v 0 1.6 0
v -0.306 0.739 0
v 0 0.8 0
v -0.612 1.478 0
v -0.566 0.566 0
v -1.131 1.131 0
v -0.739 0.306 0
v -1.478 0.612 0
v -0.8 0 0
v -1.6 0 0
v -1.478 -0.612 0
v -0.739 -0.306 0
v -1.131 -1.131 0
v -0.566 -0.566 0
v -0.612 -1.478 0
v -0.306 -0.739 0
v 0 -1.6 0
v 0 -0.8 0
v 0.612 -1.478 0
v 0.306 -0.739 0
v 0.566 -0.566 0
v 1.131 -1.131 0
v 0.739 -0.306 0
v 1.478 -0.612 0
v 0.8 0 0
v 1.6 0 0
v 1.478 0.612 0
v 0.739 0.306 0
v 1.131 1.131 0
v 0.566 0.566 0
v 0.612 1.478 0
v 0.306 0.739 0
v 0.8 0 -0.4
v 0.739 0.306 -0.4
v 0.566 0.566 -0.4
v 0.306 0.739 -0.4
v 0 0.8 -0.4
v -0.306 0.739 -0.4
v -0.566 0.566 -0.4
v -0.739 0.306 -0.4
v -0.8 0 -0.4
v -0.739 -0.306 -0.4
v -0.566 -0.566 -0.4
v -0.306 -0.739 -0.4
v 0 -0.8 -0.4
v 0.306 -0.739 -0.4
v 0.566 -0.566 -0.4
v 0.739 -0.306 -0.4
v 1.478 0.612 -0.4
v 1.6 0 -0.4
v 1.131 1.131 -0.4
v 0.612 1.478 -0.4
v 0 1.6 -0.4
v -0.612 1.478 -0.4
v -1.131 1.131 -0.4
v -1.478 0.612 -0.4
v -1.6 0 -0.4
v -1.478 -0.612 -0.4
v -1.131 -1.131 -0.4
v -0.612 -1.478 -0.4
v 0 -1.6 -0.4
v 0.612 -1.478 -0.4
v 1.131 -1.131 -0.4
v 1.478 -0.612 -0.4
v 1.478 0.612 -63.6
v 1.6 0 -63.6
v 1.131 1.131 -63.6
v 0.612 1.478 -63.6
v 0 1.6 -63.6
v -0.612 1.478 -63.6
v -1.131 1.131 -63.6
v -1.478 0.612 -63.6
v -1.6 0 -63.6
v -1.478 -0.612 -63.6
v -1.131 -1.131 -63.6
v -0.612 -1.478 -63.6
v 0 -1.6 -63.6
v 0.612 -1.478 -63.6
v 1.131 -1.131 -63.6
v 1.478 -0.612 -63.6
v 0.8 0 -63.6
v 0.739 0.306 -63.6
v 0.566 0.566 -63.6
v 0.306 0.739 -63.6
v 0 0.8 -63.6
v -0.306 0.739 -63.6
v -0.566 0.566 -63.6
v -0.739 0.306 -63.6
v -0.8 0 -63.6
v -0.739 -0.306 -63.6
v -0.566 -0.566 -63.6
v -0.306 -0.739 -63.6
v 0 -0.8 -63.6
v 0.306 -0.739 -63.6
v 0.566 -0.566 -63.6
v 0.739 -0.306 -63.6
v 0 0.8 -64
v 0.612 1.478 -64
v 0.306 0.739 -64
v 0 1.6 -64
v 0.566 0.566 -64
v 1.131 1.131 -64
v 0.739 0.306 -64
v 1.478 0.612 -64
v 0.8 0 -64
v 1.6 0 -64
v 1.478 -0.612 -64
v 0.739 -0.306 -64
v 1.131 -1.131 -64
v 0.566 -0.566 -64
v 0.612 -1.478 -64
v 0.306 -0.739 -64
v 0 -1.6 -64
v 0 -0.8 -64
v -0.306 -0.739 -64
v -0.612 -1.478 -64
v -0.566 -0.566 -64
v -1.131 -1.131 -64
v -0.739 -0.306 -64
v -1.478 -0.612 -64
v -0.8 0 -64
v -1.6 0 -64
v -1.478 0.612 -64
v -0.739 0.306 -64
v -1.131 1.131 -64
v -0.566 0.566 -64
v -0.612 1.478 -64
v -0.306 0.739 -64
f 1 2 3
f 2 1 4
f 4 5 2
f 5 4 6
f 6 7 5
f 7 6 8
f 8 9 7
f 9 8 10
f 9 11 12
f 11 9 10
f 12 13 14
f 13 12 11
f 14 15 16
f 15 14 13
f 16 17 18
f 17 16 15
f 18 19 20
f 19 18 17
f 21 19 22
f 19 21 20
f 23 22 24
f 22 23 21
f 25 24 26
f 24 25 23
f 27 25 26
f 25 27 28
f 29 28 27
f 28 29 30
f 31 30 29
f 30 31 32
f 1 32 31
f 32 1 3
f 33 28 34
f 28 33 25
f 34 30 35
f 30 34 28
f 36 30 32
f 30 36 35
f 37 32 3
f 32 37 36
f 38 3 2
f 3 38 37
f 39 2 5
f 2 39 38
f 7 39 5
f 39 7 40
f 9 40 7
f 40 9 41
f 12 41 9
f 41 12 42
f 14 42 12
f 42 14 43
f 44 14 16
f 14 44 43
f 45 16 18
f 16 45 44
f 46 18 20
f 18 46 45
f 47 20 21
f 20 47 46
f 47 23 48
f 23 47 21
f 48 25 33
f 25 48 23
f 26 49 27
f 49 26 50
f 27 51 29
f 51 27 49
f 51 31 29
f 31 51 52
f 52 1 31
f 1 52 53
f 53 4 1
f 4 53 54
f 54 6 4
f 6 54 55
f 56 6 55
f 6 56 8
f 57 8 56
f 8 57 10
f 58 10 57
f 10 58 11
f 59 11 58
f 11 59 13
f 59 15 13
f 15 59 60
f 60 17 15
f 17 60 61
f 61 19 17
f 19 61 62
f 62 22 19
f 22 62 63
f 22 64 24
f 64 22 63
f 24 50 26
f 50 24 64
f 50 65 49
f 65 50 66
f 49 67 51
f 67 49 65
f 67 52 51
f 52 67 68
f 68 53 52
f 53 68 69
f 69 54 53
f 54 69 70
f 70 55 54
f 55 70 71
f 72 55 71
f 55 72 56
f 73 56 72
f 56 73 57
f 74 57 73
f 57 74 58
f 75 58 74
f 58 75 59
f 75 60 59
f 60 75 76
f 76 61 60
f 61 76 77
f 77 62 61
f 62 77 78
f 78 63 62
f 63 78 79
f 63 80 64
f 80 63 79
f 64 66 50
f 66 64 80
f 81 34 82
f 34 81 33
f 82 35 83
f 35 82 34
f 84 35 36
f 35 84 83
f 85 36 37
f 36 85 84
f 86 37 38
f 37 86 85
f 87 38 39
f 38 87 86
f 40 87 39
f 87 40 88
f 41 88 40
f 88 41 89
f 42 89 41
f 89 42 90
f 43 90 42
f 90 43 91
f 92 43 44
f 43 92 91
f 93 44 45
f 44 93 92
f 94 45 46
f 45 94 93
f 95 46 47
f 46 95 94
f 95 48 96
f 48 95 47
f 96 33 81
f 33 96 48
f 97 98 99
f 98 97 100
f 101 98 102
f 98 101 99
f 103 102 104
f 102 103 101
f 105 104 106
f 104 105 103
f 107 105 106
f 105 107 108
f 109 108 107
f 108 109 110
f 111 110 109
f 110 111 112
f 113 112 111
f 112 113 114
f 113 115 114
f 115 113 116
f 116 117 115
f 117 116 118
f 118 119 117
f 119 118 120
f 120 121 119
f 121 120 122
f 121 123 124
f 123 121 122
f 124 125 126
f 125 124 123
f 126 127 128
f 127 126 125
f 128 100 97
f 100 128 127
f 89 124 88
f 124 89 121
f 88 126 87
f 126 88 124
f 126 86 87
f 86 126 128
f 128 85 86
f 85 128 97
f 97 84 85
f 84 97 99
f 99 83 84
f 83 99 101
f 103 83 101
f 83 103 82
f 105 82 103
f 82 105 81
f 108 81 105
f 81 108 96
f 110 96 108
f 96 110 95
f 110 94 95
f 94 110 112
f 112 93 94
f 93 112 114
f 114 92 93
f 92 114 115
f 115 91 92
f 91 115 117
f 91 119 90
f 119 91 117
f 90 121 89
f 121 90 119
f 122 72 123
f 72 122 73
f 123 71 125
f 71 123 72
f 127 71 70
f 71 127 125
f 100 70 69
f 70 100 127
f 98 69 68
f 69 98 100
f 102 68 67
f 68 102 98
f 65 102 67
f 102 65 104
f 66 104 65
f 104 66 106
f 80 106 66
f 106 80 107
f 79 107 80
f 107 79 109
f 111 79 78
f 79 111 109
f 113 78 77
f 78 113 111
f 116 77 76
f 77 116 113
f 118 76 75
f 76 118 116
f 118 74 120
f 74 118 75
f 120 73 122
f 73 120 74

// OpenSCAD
// file: ../p/4-4ring1.scad
use <../lib.scad>
function ldraw_lib__4_4ring1() = [
// 0 Ring  1 x 1.0
// 0 Name: 4-4ring1.dat
// 0 Author: James Jessiman
// 0 !LDRAW_ORG Primitive UPDATE 2009-01
// 0 !LICENSE Licensed under CC BY 2.0 and CC BY 4.0 : see CAreadme.txt
// 
// 0 BFC CERTIFY CCW
  [0,"BFC","CERTIFY"],
  [0,"BFC","CCW"],
// 
// 0 !HISTORY 1998-12-15 [PTadmin] Official Update 1998-10
// 0 !HISTORY 2002-04-08 [BrickCaster] Modified for BFC compliance
// 0 !HISTORY 2002-04-25 [PTadmin] Official Update 2002-02
// 0 !HISTORY 2007-06-24 [PTadmin] Header formatted for Contributor Agreement
// 0 !HISTORY 2008-07-01 [PTadmin] Official Update 2008-01
// 0 !HISTORY 2008-08-26 [cwdee] Switch polygon winding and rename
// 0 !HISTORY 2009-05-02 [PTadmin] Official Update 2009-01
// 
// 
// 4 16 -0.7654 0 1.8478 -0.3827 0 0.9239 0 0 1 0 0 2
  [4,16,-0.7654,0,1.8478,-0.3827,0,0.9239,0,0,1,0,0,2],
// 4 16 -1.4142 0 1.4142 -0.7071 0 0.7071 -0.3827 0 0.9239 -0.7654 0 1.8478
  [4,16,-1.4142,0,1.4142,-0.7071,0,0.7071,-0.3827,0,0.9239,-0.7654,0,1.8478],
// 4 16 -1.8478 0 0.7654 -0.9239 0 0.3827 -0.7071 0 0.7071 -1.4142 0 1.41420
  [4,16,-1.8478,0,0.7654,-0.9239,0,0.3827,-0.7071,0,0.7071,-1.4142,0,1.41420],
// 4 16 -2 0 0 -1 0 0 -0.9239 0 0.3827 -1.8478 0 0.7654
  [4,16,-2,0,0,-1,0,0,-0.9239,0,0.3827,-1.8478,0,0.7654],
// 4 16 -1.8478 0 -0.7654 -0.9239 0 -0.3827 -1 0 0 -2 0 0
  [4,16,-1.8478,0,-0.7654,-0.9239,0,-0.3827,-1,0,0,-2,0,0],
// 4 16 -1.4142 0 -1.4142 -0.7071 0 -0.7071 -0.9239 0 -0.3827 -1.8478 0 -0.7654
  [4,16,-1.4142,0,-1.4142,-0.7071,0,-0.7071,-0.9239,0,-0.3827,-1.8478,0,-0.7654],
// 4 16 -0.7654 0 -1.8478 -0.3827 0 -0.9239 -0.7071 0 -0.7071 -1.4142 0 -1.4142
  [4,16,-0.7654,0,-1.8478,-0.3827,0,-0.9239,-0.7071,0,-0.7071,-1.4142,0,-1.4142],
// 4 16 0 0 -2 0 0 -1 -0.3827 0 -0.9239 -0.7654 0 -1.8478
  [4,16,0,0,-2,0,0,-1,-0.3827,0,-0.9239,-0.7654,0,-1.8478],
// 4 16 0.7654 0 -1.8478 0.3827 0 -0.9239 0 0 -1 0 0 -2
  [4,16,0.7654,0,-1.8478,0.3827,0,-0.9239,0,0,-1,0,0,-2],
// 4 16 1.4142 0 -1.4142 0.7071 0 -0.7071 0.3827 0 -0.9239 0.7654 0 -1.8478
  [4,16,1.4142,0,-1.4142,0.7071,0,-0.7071,0.3827,0,-0.9239,0.7654,0,-1.8478],
// 4 16 1.8478 0 -0.7654 0.9239 0 -0.3827 0.7071 0 -0.7071 1.4142 0 -1.4142
  [4,16,1.8478,0,-0.7654,0.9239,0,-0.3827,0.7071,0,-0.7071,1.4142,0,-1.4142],
// 4 16 2 0 0 1 0 0 0.9239 0 -0.3827 1.8478 0 -0.7654
  [4,16,2,0,0,1,0,0,0.9239,0,-0.3827,1.8478,0,-0.7654],
// 4 16 1.8478 0 0.7654 0.9239 0 0.3827 1 0 0 2 0 0
  [4,16,1.8478,0,0.7654,0.9239,0,0.3827,1,0,0,2,0,0],
// 4 16 1.4142 0 1.4142 0.7071 0 0.7071 0.9239 0 0.3827 1.8478 0 0.7654
  [4,16,1.4142,0,1.4142,0.7071,0,0.7071,0.9239,0,0.3827,1.8478,0,0.7654],
// 4 16 0.7654 0 1.8478 0.3827 0 0.9239 0.7071 0 0.7071 1.4142 0 1.4142
  [4,16,0.7654,0,1.8478,0.3827,0,0.9239,0.7071,0,0.7071,1.4142,0,1.4142],
// 4 16 0 0 2 0 0 1 0.3827 0 0.9239 0.7654 0 1.8478
  [4,16,0,0,2,0,0,1,0.3827,0,0.9239,0.7654,0,1.8478],
// 0
];
module ldraw_lib__4_4ring1(step=0, col=false, unit=2/5, alt=false, line=0.2, solid=!$preview)
    makepoly(ldraw_lib__4_4ring1(), step=step, col=col, unit=unit, alt=alt, line=line, solid=solid);
ldraw_lib__4_4ring1(line=0.2);
// file: ../p/4-4edge.scad
use <../lib.scad>
function ldraw_lib__4_4edge() = [
// 0 Circle 1.0
// 0 Name: 4-4edge.dat
// 0 Author: James Jessiman
// 0 !LDRAW_ORG Primitive UPDATE 2017-01
// 0 !LICENSE Licensed under CC BY 4.0 : see CAreadme.txt
// 
// 0 BFC CERTIFY CCW
  [0,"BFC","CERTIFY"],
  [0,"BFC","CCW"],
// 
// 0 !HISTORY 1998-12-15 [PTadmin] Official Update 1998-10
// 0 !HISTORY 2005-12-28 [PTadmin] Official Update 2005-01
// 0 !HISTORY 2007-06-24 [PTadmin] Header formatted for Contributor Agreement
// 0 !HISTORY 2008-07-01 [PTadmin] Official Update 2008-01
// 0 !HISTORY 2017-01-15 [Steffen] BFCed
// 0 !HISTORY 2017-12-30 [PTadmin] Official Update 2017-01
// 
// 
// 2 24 1 0 0 0.9239 0 0.3827
  [2,24,1,0,0,0.9239,0,0.3827],
// 2 24 0.9239 0 0.3827 0.7071 0 0.7071
  [2,24,0.9239,0,0.3827,0.7071,0,0.7071],
// 2 24 0.7071 0 0.7071 0.3827 0 0.9239
  [2,24,0.7071,0,0.7071,0.3827,0,0.9239],
// 2 24 0.3827 0 0.9239 0 0 1
  [2,24,0.3827,0,0.9239,0,0,1],
// 2 24 0 0 1 -0.3827 0 0.9239
  [2,24,0,0,1,-0.3827,0,0.9239],
// 2 24 -0.3827 0 0.9239 -0.7071 0 0.7071
  [2,24,-0.3827,0,0.9239,-0.7071,0,0.7071],
// 2 24 -0.7071 0 0.7071 -0.9239 0 0.3827
  [2,24,-0.7071,0,0.7071,-0.9239,0,0.3827],
// 2 24 -0.9239 0 0.3827 -1 0 -0
  [2,24,-0.9239,0,0.3827,-1,0,-0],
// 2 24 -1 0 -0 -0.9239 0 -0.3827
  [2,24,-1,0,-0,-0.9239,0,-0.3827],
// 2 24 -0.9239 0 -0.3827 -0.7071 0 -0.7071
  [2,24,-0.9239,0,-0.3827,-0.7071,0,-0.7071],
// 2 24 -0.7071 0 -0.7071 -0.3827 0 -0.9239
  [2,24,-0.7071,0,-0.7071,-0.3827,0,-0.9239],
// 2 24 -0.3827 0 -0.9239 0 0 -1
  [2,24,-0.3827,0,-0.9239,0,0,-1],
// 2 24 0 0 -1 0.3827 0 -0.9239
  [2,24,0,0,-1,0.3827,0,-0.9239],
// 2 24 0.3827 0 -0.9239 0.7071 0 -0.7071
  [2,24,0.3827,0,-0.9239,0.7071,0,-0.7071],
// 2 24 0.7071 0 -0.7071 0.9239 0 -0.3827
  [2,24,0.7071,0,-0.7071,0.9239,0,-0.3827],
// 2 24 0.9239 0 -0.3827 1 0 0
  [2,24,0.9239,0,-0.3827,1,0,0],
];
module ldraw_lib__4_4edge(step=0, col=false, unit=2/5, alt=false, line=0.2, solid=!$preview)
    makepoly(ldraw_lib__4_4edge(), step=step, col=col, unit=unit, alt=alt, line=line, solid=solid);
ldraw_lib__4_4edge(line=0.2);
// file: ../p/4-4cyli.scad
use <../lib.scad>
function ldraw_lib__4_4cyli() = [
// 0 Cylinder 1.0
// 0 Name: 4-4cyli.dat
// 0 Author: James Jessiman
// 0 !LDRAW_ORG Primitive UPDATE 2005-01
// 0 !LICENSE Licensed under CC BY 2.0 and CC BY 4.0 : see CAreadme.txt
// 
// 0 BFC CERTIFY CCW
  [0,"BFC","CERTIFY"],
  [0,"BFC","CCW"],
// 
// 0 !HISTORY 1998-12-15 [PTadmin] Official Update 1998-10
// 0 !HISTORY 2002-03-23 [sbliss] Added BFC statement; merged headers from files in distributions LDraw 0.27 and Complete.
// 0 !HISTORY 2002-04-25 [PTadmin] Official Update 2002-02
// 0 !HISTORY 2004-12-14 [guyvivan] BFC CCW
// 0 !HISTORY 2005-12-28 [PTadmin] Official Update 2005-01
// 0 !HISTORY 2007-06-24 [PTadmin] Header formatted for Contributor Agreement
// 0 !HISTORY 2008-07-01 [PTadmin] Official Update 2008-01
// 
// 
// 4 16 1 1 0 0.9239 1 0.3827 0.9239 0 0.3827 1 0 0
  [4,16,1,1,0,0.9239,1,0.3827,0.9239,0,0.3827,1,0,0],
// 5 24 1 0 0 1 1 0 0.9239 0 0.3827 0.9239 0 -0.3827
  [5,24,1,0,0,1,1,0,0.9239,0,0.3827,0.9239,0,-0.3827],
// 4 16 0.9239 1 0.3827 0.7071 1 0.7071 0.7071 0 0.7071 0.9239 0 0.3827
  [4,16,0.9239,1,0.3827,0.7071,1,0.7071,0.7071,0,0.7071,0.9239,0,0.3827],
// 5 24 0.9239 0 0.3827 0.9239 1 0.3827 0.7071 0 0.7071 1 0 0
  [5,24,0.9239,0,0.3827,0.9239,1,0.3827,0.7071,0,0.7071,1,0,0],
// 4 16 0.7071 1 0.7071 0.3827 1 0.9239 0.3827 0 0.9239 0.7071 0 0.7071
  [4,16,0.7071,1,0.7071,0.3827,1,0.9239,0.3827,0,0.9239,0.7071,0,0.7071],
// 5 24 0.7071 0 0.7071 0.7071 1 0.7071 0.3827 0 0.9239 0.9239 0 0.3827
  [5,24,0.7071,0,0.7071,0.7071,1,0.7071,0.3827,0,0.9239,0.9239,0,0.3827],
// 4 16 0.3827 1 0.9239 0 1 1 0 0 1 0.3827 0 0.9239
  [4,16,0.3827,1,0.9239,0,1,1,0,0,1,0.3827,0,0.9239],
// 5 24 0.3827 0 0.9239 0.3827 1 0.9239 0 0 1 0.7071 0 0.7071
  [5,24,0.3827,0,0.9239,0.3827,1,0.9239,0,0,1,0.7071,0,0.7071],
// 4 16 0 1 1 -0.3827 1 0.9239 -0.3827 0 0.9239 0 0 1
  [4,16,0,1,1,-0.3827,1,0.9239,-0.3827,0,0.9239,0,0,1],
// 5 24 0 0 1 0 1 1 -0.3827 0 0.9239 0.3827 0 0.9239
  [5,24,0,0,1,0,1,1,-0.3827,0,0.9239,0.3827,0,0.9239],
// 4 16 -0.3827 1 0.9239 -0.7071 1 0.7071 -0.7071 0 0.7071 -0.3827 0 0.9239
  [4,16,-0.3827,1,0.9239,-0.7071,1,0.7071,-0.7071,0,0.7071,-0.3827,0,0.9239],
// 5 24 -0.3827 0 0.9239 -0.3827 1 0.9239 -0.7071 0 0.7071 0 0 1
  [5,24,-0.3827,0,0.9239,-0.3827,1,0.9239,-0.7071,0,0.7071,0,0,1],
// 4 16 -0.7071 1 0.7071 -0.9239 1 0.3827 -0.9239 0 0.3827 -0.7071 0 0.7071
  [4,16,-0.7071,1,0.7071,-0.9239,1,0.3827,-0.9239,0,0.3827,-0.7071,0,0.7071],
// 5 24 -0.7071 0 0.7071 -0.7071 1 0.7071 -0.9239 0 0.3827 -0.3827 0 0.9239
  [5,24,-0.7071,0,0.7071,-0.7071,1,0.7071,-0.9239,0,0.3827,-0.3827,0,0.9239],
// 4 16 -0.9239 1 0.3827 -1 1 0 -1 0 0 -0.9239 0 0.3827
  [4,16,-0.9239,1,0.3827,-1,1,0,-1,0,0,-0.9239,0,0.3827],
// 5 24 -0.9239 0 0.3827 -0.9239 1 0.3827 -1 0 0 -0.7071 0 0.7071
  [5,24,-0.9239,0,0.3827,-0.9239,1,0.3827,-1,0,0,-0.7071,0,0.7071],
// 4 16 -1 1 0 -0.9239 1 -0.3827 -0.9239 0 -0.3827 -1 0 0
  [4,16,-1,1,0,-0.9239,1,-0.3827,-0.9239,0,-0.3827,-1,0,0],
// 5 24 -1 0 0 -1 1 0 -0.9239 0 -0.3827 -0.9239 0 0.3827
  [5,24,-1,0,0,-1,1,0,-0.9239,0,-0.3827,-0.9239,0,0.3827],
// 4 16 -0.9239 1 -0.3827 -0.7071 1 -0.7071 -0.7071 0 -0.7071 -0.9239 0 -0.3827
  [4,16,-0.9239,1,-0.3827,-0.7071,1,-0.7071,-0.7071,0,-0.7071,-0.9239,0,-0.3827],
// 5 24 -0.9239 0 -0.3827 -0.9239 1 -0.3827 -0.7071 0 -0.7071 -1 0 0
  [5,24,-0.9239,0,-0.3827,-0.9239,1,-0.3827,-0.7071,0,-0.7071,-1,0,0],
// 4 16 -0.7071 1 -0.7071 -0.3827 1 -0.9239 -0.3827 0 -0.9239 -0.7071 0 -0.7071
  [4,16,-0.7071,1,-0.7071,-0.3827,1,-0.9239,-0.3827,0,-0.9239,-0.7071,0,-0.7071],
// 5 24 -0.7071 0 -0.7071 -0.7071 1 -0.7071 -0.3827 0 -0.9239 -0.9239 0 -0.3827
  [5,24,-0.7071,0,-0.7071,-0.7071,1,-0.7071,-0.3827,0,-0.9239,-0.9239,0,-0.3827],
// 4 16 -0.3827 1 -0.9239 0 1 -1 0 0 -1 -0.3827 0 -0.9239
  [4,16,-0.3827,1,-0.9239,0,1,-1,0,0,-1,-0.3827,0,-0.9239],
// 5 24 -0.3827 0 -0.9239 -0.3827 1 -0.9239 0 0 -1 -0.7071 0 -0.7071
  [5,24,-0.3827,0,-0.9239,-0.3827,1,-0.9239,0,0,-1,-0.7071,0,-0.7071],
// 4 16 0 1 -1 0.3827 1 -0.9239 0.3827 0 -0.9239 0 0 -1
  [4,16,0,1,-1,0.3827,1,-0.9239,0.3827,0,-0.9239,0,0,-1],
// 5 24 0 0 -1 0 1 -1 0.3827 0 -0.9239 -0.3827 0 -0.9239
  [5,24,0,0,-1,0,1,-1,0.3827,0,-0.9239,-0.3827,0,-0.9239],
// 4 16 0.3827 1 -0.9239 0.7071 1 -0.7071 0.7071 0 -0.7071 0.3827 0 -0.9239
  [4,16,0.3827,1,-0.9239,0.7071,1,-0.7071,0.7071,0,-0.7071,0.3827,0,-0.9239],
// 5 24 0.3827 0 -0.9239 0.3827 1 -0.9239 0.7071 0 -0.7071 0 0 -1
  [5,24,0.3827,0,-0.9239,0.3827,1,-0.9239,0.7071,0,-0.7071,0,0,-1],
// 4 16 0.7071 1 -0.7071 0.9239 1 -0.3827 0.9239 0 -0.3827 0.7071 0 -0.7071
  [4,16,0.7071,1,-0.7071,0.9239,1,-0.3827,0.9239,0,-0.3827,0.7071,0,-0.7071],
// 5 24 0.7071 0 -0.7071 0.7071 1 -0.7071 0.9239 0 -0.3827 0.3827 0 -0.9239
  [5,24,0.7071,0,-0.7071,0.7071,1,-0.7071,0.9239,0,-0.3827,0.3827,0,-0.9239],
// 4 16 0.9239 1 -0.3827 1 1 0 1 0 0 0.9239 0 -0.3827
  [4,16,0.9239,1,-0.3827,1,1,0,1,0,0,0.9239,0,-0.3827],
// 5 24 0.9239 0 -0.3827 0.9239 1 -0.3827 1 0 0 0.7071 0 -0.7071
  [5,24,0.9239,0,-0.3827,0.9239,1,-0.3827,1,0,0,0.7071,0,-0.7071],
// 0
];
module ldraw_lib__4_4cyli(step=0, col=false, unit=2/5, alt=false, line=0.2, solid=!$preview)
    makepoly(ldraw_lib__4_4cyli(), step=step, col=col, unit=unit, alt=alt, line=line, solid=solid);
ldraw_lib__4_4cyli(line=0.2);
// file: u9053.scad
use <../lib.scad>
use <../p/4-4cyli.scad>
use <../p/4-4edge.scad>
use <../p/4-4ring1.scad>
function ldraw_lib__u9053() = [
// 0 ~Technic Flex-System Hose End
// 0 Name: u9053.dat
// 0 Author: William Howard [WilliamH]
// 0 !LDRAW_ORG Part UPDATE 2011-02
// 0 !LICENSE Licensed under CC BY 2.0 and CC BY 4.0 : see CAreadme.txt
// 
// 0 BFC CERTIFY CCW
  [0,"BFC","CERTIFY"],
  [0,"BFC","CCW"],
// 
// 0 !HISTORY 2011-12-21 [cwdee] Reworked subparting technique
// 0 !HISTORY 2011-12-23 [PTadmin] Renamed from 76
// 0 !HISTORY 2011-12-29 [PTadmin] Official Update 2011-02
// 
// 
// 1 16 0 0 0 2 0 0 0 1 0 0 0 2 4-4ring1.dat
  [1,16,0,0,0,2,0,0,0,1,0,0,0,2, ldraw_lib__4_4ring1()],
// 1 16 0 0 0 2 0 0 0 1 0 0 0 2 4-4edge.dat
  [1,16,0,0,0,2,0,0,0,1,0,0,0,2, ldraw_lib__4_4edge()],
// 0 BFC INVERTNEXT
  [0,"BFC","INVERTNEXT"],
// 1 16 0 0 0 2 0 0 0 1 0 0 0 2 4-4cyli.dat
  [1,16,0,0,0,2,0,0,0,1,0,0,0,2, ldraw_lib__4_4cyli()],
// 1 16 0 0 0 4 0 0 0 1 0 0 0 4 4-4edge.dat
  [1,16,0,0,0,4,0,0,0,1,0,0,0,4, ldraw_lib__4_4edge()],
// 1 16 0 0 0 4 0 0 0 1 0 0 0 4 4-4cyli.dat
  [1,16,0,0,0,4,0,0,0,1,0,0,0,4, ldraw_lib__4_4cyli()],
// 0
];
module ldraw_lib__u9053(step=0, col=false, unit=2/5, alt=false, line=0.2, solid=!$preview)
    makepoly(ldraw_lib__u9053(), step=step, col=col, unit=unit, alt=alt, line=line, solid=solid);
ldraw_lib__u9053(line=0.2);
// file: 77.scad
use <../lib.scad>
use <../p/4-4cyli.scad>
function ldraw_lib__77() = [
// 0 ~Technic Flex-System Hose Segment
// 0 Name: 77.dat
// 0 Author: William Howard [WilliamH]
// 0 !LDRAW_ORG Part UPDATE 2011-02
// 0 !LICENSE Licensed under CC BY 2.0 and CC BY 4.0 : see CAreadme.txt
// 
// 0 BFC CERTIFY CCW
  [0,"BFC","CERTIFY"],
  [0,"BFC","CCW"],
// 
// 0 !HISTORY 2011-12-21 [cwdee] Reworked subparting technique
// 0 !HISTORY 2011-12-29 [PTadmin] Official Update 2011-02
// 
// 
// 1 16 0 0 0 4 0 0 0 1 0 0 0 4 4-4cyli.dat
  [1,16,0,0,0,4,0,0,0,1,0,0,0,4, ldraw_lib__4_4cyli()],
// 0 BFC INVERTNEXT
  [0,"BFC","INVERTNEXT"],
// 1 16 0 0 0 2 0 0 0 1 0 0 0 2 4-4cyli.dat
  [1,16,0,0,0,2,0,0,0,1,0,0,0,2, ldraw_lib__4_4cyli()],
// 0
];
module ldraw_lib__77(step=0, col=false, unit=2/5, alt=false, line=0.2, solid=!$preview)
    makepoly(ldraw_lib__77(), step=step, col=col, unit=unit, alt=alt, line=line, solid=solid);
ldraw_lib__77(line=0.2);
// main file
use <../lib.scad>
use <77.scad>
use <u9053.scad>
function ldraw_lib__76260() = [
// 0 Technic Flex-System Hose  8L (160LDU)
// 0 Name: 76260.dat
// 0 Author: Tim Gould [timgould]
// 0 !LDRAW_ORG Part UPDATE 2011-02
// 0 !LICENSE Licensed under CC BY 4.0 : see CAreadme.txt
// 
// 0 BFC CERTIFY CCW
  [0,"BFC","CERTIFY"],
  [0,"BFC","CCW"],
// 
// 0 !KEYWORDS bar, tube
// 
// 0 !HISTORY 2011-12-29 [PTadmin] Official Update 2011-02
// 
// 
// 1 16 0 0 0 1 0 0 0 1 0 0 0 1 u9053.dat
  [1,16,0,0,0,1,0,0,0,1,0,0,0,1, ldraw_lib__u9053()],
// 1 16 0 1 0 1 0 0 0 158 0 0 0 1 77.dat
  [1,16,0,1,0,1,0,0,0,158,0,0,0,1, ldraw_lib__77()],
// 1 16 0 160 0 -1 0 0 0 -1 0 0 0 1 u9053.dat
  [1,16,0,160,0,-1,0,0,0,-1,0,0,0,1, ldraw_lib__u9053()],
];
module ldraw_lib__76260(step=0, col=false, unit=2/5, alt=false, line=0.2, solid=!$preview)
    makepoly(ldraw_lib__76260(), step=step, col=col, unit=unit, alt=alt, line=line, solid=solid);
ldraw_lib__76260(line=0.2);
